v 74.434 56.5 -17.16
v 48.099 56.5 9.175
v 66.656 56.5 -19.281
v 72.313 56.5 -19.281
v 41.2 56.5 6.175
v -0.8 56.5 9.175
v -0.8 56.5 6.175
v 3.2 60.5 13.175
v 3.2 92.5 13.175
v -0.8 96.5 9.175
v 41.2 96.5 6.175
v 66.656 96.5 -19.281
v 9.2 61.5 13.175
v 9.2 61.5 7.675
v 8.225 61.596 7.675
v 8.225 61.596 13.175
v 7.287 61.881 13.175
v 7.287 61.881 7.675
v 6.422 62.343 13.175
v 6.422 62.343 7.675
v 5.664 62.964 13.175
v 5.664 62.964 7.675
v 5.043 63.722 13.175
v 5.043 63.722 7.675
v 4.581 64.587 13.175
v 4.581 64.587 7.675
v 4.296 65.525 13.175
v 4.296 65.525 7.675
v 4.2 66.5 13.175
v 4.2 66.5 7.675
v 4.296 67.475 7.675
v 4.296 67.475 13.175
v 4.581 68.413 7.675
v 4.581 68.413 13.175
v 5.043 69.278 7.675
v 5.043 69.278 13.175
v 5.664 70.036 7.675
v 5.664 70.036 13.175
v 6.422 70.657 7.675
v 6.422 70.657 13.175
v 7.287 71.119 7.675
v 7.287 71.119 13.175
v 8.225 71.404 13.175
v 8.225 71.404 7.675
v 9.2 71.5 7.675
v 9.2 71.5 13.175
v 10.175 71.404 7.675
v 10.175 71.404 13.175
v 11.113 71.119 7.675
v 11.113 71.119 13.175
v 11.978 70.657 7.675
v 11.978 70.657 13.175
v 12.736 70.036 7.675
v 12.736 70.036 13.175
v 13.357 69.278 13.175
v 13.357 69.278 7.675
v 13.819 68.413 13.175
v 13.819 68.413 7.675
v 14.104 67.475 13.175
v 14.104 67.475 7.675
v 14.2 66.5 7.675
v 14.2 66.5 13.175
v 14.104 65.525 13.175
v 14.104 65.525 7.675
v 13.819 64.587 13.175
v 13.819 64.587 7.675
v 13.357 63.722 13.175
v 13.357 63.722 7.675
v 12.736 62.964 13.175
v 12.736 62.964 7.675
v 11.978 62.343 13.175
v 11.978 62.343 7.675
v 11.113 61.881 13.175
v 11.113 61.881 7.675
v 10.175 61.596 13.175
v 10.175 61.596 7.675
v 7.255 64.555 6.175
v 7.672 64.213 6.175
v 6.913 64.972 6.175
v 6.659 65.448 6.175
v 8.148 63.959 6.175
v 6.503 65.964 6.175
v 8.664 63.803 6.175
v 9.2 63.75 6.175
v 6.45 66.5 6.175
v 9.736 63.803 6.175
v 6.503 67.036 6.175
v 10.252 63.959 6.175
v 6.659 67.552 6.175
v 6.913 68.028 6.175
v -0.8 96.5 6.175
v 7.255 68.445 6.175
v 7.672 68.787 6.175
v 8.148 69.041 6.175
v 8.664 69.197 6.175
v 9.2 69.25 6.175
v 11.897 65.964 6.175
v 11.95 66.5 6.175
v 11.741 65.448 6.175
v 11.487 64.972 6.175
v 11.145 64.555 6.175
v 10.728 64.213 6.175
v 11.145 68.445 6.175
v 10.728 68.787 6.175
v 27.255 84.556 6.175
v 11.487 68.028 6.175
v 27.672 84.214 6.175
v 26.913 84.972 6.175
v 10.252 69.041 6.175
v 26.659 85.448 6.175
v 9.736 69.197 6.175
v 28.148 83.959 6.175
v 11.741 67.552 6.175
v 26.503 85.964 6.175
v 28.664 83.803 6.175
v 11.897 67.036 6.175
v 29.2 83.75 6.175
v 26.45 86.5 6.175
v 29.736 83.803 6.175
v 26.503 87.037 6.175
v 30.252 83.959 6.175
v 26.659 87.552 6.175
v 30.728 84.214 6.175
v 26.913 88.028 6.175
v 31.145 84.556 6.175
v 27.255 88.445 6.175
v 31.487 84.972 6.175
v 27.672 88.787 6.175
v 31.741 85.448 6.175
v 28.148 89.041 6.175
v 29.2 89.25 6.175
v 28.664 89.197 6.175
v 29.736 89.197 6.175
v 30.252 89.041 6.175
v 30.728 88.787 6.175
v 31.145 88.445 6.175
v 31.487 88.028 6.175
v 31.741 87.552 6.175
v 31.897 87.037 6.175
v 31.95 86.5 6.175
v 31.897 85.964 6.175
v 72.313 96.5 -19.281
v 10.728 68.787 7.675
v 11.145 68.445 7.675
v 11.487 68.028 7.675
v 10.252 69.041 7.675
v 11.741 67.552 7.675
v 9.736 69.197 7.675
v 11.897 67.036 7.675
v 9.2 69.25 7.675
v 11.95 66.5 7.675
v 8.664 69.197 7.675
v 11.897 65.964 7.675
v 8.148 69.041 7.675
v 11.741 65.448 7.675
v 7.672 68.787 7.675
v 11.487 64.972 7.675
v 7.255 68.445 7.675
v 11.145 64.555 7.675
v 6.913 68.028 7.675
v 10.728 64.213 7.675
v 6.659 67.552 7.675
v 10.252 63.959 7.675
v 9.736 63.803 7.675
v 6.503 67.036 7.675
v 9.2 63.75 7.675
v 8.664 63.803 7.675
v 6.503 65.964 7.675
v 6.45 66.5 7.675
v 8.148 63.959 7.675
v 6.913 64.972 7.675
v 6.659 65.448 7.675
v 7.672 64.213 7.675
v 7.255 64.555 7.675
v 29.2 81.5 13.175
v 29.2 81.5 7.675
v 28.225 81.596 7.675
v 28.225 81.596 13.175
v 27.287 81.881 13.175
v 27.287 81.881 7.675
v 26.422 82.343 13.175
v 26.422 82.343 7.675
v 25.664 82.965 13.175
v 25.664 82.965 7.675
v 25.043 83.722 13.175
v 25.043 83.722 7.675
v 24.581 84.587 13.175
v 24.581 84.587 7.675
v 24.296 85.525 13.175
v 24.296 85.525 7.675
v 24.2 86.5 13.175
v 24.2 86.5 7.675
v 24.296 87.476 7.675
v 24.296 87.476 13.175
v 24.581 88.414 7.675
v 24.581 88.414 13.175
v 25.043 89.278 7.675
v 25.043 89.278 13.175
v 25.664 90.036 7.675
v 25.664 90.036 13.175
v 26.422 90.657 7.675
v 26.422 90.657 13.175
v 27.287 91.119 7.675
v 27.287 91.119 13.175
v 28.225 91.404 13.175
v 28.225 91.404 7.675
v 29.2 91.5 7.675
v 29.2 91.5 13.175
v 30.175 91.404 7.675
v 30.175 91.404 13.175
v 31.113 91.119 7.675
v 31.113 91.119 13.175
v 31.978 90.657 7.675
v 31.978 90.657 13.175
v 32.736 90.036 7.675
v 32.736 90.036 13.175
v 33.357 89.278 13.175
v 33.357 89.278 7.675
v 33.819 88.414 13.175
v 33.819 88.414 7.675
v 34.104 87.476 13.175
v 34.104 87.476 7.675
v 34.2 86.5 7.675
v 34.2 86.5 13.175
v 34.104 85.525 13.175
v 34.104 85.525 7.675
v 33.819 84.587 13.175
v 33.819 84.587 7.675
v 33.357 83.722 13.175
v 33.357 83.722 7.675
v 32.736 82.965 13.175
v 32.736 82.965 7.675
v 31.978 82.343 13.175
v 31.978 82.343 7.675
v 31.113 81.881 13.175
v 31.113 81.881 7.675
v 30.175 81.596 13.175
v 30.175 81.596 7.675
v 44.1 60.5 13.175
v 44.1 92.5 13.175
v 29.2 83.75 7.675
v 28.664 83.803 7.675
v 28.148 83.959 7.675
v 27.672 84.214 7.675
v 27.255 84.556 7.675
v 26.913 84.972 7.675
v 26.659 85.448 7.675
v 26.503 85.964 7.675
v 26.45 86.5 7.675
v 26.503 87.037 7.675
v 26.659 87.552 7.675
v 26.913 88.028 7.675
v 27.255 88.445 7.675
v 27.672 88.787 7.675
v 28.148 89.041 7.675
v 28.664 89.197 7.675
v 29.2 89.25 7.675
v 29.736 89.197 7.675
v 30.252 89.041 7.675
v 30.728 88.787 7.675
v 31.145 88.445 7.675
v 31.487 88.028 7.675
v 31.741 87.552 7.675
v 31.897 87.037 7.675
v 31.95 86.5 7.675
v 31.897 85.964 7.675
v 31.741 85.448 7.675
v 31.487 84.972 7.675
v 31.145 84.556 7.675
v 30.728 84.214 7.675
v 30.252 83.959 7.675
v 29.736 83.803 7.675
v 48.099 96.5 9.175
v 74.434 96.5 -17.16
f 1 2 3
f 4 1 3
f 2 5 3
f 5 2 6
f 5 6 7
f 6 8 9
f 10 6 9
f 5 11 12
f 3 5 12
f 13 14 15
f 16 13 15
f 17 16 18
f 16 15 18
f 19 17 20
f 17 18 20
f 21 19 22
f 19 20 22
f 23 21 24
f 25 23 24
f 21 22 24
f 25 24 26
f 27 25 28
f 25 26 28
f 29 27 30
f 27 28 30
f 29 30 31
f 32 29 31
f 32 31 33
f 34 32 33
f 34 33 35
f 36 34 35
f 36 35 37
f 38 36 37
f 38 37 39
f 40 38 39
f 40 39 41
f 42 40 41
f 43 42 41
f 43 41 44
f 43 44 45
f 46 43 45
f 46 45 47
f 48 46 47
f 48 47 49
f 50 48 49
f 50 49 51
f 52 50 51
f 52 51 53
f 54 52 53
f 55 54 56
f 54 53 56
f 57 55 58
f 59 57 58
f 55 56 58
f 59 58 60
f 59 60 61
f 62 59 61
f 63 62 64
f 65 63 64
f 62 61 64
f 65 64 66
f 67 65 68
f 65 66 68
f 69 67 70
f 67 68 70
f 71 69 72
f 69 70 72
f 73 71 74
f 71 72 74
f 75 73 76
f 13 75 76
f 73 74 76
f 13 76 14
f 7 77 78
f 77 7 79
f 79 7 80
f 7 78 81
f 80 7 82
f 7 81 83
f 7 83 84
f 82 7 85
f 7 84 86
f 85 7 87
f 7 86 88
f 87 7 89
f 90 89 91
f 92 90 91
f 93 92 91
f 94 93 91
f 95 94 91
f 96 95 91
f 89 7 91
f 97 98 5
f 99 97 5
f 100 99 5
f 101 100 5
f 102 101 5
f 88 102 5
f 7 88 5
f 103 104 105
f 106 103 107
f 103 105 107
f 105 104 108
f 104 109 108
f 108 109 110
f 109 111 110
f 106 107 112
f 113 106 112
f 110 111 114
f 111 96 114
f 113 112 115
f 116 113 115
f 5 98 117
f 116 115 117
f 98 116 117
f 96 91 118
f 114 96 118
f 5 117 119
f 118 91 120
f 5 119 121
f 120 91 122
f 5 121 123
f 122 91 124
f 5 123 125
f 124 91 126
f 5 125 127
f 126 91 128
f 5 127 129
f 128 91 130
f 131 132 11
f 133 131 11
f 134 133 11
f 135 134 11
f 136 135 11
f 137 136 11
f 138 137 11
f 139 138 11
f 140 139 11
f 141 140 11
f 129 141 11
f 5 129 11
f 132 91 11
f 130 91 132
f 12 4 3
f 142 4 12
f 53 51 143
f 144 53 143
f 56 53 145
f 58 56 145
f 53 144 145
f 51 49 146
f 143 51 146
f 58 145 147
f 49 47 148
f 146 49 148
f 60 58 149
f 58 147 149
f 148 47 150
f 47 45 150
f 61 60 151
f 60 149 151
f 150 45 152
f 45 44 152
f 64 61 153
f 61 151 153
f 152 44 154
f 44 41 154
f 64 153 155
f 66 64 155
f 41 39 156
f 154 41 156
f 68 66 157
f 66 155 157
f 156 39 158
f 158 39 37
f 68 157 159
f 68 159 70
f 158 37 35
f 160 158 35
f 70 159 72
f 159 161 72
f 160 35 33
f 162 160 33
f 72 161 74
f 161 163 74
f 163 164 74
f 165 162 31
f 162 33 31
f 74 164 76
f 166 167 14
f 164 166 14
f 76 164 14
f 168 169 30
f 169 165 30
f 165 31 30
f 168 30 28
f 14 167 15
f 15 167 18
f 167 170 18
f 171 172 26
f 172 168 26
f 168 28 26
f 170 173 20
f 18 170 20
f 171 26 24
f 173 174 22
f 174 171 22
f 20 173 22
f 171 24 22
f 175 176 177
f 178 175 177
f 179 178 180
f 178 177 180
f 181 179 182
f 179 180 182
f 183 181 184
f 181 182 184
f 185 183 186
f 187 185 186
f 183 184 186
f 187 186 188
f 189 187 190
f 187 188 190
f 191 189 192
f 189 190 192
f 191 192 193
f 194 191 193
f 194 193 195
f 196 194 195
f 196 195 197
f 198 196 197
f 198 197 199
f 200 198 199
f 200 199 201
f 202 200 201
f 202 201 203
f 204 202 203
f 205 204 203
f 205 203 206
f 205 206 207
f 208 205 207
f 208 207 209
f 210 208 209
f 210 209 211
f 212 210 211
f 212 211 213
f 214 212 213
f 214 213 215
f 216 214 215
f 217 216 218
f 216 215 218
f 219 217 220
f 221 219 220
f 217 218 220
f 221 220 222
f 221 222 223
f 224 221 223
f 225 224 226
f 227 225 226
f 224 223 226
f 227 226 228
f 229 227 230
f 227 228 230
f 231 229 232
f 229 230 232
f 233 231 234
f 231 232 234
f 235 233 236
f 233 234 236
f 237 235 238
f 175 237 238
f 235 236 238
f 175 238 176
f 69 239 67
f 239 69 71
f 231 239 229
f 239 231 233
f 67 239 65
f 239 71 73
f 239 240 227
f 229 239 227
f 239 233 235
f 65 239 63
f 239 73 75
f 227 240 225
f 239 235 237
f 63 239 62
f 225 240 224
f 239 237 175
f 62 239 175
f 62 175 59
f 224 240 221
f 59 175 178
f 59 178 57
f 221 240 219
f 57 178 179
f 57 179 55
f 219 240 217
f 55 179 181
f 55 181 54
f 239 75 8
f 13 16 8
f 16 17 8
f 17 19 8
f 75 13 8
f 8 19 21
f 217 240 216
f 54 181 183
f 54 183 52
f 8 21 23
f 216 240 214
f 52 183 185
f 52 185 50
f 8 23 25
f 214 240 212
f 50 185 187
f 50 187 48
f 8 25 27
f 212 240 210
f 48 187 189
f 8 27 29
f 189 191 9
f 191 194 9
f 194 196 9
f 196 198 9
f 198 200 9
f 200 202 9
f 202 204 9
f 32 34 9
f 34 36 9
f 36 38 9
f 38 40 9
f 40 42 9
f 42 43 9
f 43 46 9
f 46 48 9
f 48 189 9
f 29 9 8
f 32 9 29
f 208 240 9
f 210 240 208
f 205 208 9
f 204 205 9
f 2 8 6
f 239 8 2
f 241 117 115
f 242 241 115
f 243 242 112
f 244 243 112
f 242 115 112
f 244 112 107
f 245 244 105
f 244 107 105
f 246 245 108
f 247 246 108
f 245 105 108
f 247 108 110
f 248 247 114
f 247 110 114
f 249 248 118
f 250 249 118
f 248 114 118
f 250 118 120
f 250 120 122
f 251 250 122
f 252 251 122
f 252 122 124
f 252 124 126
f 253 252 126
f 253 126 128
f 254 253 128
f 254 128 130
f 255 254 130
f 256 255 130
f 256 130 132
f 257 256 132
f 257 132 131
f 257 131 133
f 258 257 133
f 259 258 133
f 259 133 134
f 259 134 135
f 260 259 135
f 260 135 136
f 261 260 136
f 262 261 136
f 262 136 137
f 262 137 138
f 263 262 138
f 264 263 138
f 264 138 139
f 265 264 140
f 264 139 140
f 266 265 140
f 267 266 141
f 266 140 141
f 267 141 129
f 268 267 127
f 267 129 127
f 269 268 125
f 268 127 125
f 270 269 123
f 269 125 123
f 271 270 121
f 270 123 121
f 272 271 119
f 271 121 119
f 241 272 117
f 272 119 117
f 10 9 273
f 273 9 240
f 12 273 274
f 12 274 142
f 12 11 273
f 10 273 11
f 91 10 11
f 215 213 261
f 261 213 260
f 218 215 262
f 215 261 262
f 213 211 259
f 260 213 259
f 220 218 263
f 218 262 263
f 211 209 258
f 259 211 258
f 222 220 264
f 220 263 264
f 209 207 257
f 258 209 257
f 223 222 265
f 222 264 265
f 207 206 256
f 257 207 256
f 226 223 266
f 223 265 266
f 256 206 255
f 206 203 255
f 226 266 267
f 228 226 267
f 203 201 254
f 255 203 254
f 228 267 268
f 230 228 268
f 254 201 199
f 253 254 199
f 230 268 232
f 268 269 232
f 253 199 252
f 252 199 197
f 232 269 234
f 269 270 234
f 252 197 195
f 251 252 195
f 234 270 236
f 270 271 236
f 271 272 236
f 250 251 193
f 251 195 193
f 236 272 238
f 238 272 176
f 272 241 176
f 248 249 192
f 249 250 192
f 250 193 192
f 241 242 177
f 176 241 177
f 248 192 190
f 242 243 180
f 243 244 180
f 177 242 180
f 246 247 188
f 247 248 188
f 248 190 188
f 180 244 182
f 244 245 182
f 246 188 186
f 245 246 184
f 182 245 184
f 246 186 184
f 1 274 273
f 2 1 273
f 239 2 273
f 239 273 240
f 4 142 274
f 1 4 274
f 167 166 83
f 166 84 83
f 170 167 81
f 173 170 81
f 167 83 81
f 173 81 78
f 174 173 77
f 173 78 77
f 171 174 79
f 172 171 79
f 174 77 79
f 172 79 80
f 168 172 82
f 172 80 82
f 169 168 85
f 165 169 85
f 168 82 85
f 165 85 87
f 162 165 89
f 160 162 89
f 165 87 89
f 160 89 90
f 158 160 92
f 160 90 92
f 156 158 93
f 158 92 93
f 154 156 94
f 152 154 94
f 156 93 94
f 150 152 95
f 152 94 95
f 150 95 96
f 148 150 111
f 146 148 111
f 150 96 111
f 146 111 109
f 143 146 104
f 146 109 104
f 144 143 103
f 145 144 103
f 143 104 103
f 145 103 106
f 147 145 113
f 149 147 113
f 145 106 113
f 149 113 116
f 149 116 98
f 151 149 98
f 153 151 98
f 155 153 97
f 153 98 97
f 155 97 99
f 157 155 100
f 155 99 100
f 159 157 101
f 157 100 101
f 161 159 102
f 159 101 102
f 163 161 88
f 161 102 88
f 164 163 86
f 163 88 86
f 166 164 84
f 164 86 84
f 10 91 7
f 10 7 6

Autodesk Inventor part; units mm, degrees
ref_plane "YZ Plane" through (0, 0, 0) normal (1, 0, 0) x (0, 1, 0)
ref_plane "XZ Plane" through (0, 0, 0) normal (0, 1, 0) x (-1, 0, 0)
ref_plane "XY Plane" through (0, 0, 0) normal (0, 0, 1) x (1, 0, 0)
ref_plane "Plano de trabajo1" through (19.2, 96.5, -0.8) normal (0, 1, 0) x (0, 0, -1)
sketch "Boceto1" plane through (19.2, 96.5, -0.8) normal (0, 1, 0) x (0, 0, -1)
  line L0 (-0.8, -18.4634) -> (-0.8, 18.4634) projected
  line L1 (-6.9748, 20) -> (-6.9748, -22)
  line L2 (-6.9748, -22) -> (21.3095, -50.2842)
  line L3 (-6.1748, 20) -> (283.8252, 20) projected
  line L4 (16.3598, -55.234) -> (-13.9748, -24.8995)
  line L5 (-13.9748, -24.8995) -> (-13.9748, 20)
  line L6 (21.3095, -50.2842) -> (16.3598, -55.234)
  line L7 (-6.9748, 20) -> (-13.9748, 20)
  point P0 (-0.8, 19.2)
  point P1 (-0.8, 18.4634)
  dimension "d0" = 135
  dimension "d1" = 42
  dimension "d2" = 40
  dimension "d3" = 7
extrude "Extrusión1" add sketch "Boceto1" against normal blind 40
chamfer "Chaflán1" distance 4 angle 45 1 edges at (69.4842, 76.5, -22.1095)
chamfer "Chaflán2" distance 4 angle 45 3 edges at (-0.8, 76.5, 13.1748) (21.6497, 96.5, 13.1748) (21.6497, 56.5, 13.1748)
sketch "Boceto2" plane through (3.2, 92.5, 13.1748) normal (0, 0, 1) x (1, 0, 0)
  circle A0 centre (6, -6) radius 2.5 projected
  circle A1 centre (26, -5.9999) radius 2.6 projected
  circle A2 centre (6, -26) radius 2.5 projected
  point P0 (-3.2, -92.5)
hole "Agujero1" at (29.2, 86.5001, 13.1748) at (9.2, 66.5, 13.1748) direction (0, 0, -1) diameter 5.5 end through all counterbore diameter 10 counterbore depth 5.5 clearance for "Tornillo de cabeza hueca DIN EN ISO 4762" size "M5" standard "DIN"
sketch "Boceto3" plane through (74.434, 56.5, -17.1598) normal (0.7071, 0, 0.7071) x (0.7071, 0, -0.7071)
  line L0 (114.1005, 77) -> (-42.8995, 77)
  line L1 (-42.8995, 77) -> (-42.8995, 0)
  line L2 (-42.8995, 0) -> (114.1005, 0)
  line L3 (114.1005, 0) -> (114.1005, 77)
  line L4 (-42.8995, 36) -> (-42.8995, 4) projected
  line L5 (0, 0) -> (-37.2426, 0) projected
  point P0 (-64.7666, -56.5)
  dimension "d19" = 157
  dimension "d20" = 77
extrude "Extrusión2" [suppressed]
equation "\"d17\" = Grosor"
equation "\"Profundidad_desahogo_plegado\" = 0.5 * Grosor"
equation "\"Grosor\" = 10"
properties part number "SoporteKlipperScreen"
